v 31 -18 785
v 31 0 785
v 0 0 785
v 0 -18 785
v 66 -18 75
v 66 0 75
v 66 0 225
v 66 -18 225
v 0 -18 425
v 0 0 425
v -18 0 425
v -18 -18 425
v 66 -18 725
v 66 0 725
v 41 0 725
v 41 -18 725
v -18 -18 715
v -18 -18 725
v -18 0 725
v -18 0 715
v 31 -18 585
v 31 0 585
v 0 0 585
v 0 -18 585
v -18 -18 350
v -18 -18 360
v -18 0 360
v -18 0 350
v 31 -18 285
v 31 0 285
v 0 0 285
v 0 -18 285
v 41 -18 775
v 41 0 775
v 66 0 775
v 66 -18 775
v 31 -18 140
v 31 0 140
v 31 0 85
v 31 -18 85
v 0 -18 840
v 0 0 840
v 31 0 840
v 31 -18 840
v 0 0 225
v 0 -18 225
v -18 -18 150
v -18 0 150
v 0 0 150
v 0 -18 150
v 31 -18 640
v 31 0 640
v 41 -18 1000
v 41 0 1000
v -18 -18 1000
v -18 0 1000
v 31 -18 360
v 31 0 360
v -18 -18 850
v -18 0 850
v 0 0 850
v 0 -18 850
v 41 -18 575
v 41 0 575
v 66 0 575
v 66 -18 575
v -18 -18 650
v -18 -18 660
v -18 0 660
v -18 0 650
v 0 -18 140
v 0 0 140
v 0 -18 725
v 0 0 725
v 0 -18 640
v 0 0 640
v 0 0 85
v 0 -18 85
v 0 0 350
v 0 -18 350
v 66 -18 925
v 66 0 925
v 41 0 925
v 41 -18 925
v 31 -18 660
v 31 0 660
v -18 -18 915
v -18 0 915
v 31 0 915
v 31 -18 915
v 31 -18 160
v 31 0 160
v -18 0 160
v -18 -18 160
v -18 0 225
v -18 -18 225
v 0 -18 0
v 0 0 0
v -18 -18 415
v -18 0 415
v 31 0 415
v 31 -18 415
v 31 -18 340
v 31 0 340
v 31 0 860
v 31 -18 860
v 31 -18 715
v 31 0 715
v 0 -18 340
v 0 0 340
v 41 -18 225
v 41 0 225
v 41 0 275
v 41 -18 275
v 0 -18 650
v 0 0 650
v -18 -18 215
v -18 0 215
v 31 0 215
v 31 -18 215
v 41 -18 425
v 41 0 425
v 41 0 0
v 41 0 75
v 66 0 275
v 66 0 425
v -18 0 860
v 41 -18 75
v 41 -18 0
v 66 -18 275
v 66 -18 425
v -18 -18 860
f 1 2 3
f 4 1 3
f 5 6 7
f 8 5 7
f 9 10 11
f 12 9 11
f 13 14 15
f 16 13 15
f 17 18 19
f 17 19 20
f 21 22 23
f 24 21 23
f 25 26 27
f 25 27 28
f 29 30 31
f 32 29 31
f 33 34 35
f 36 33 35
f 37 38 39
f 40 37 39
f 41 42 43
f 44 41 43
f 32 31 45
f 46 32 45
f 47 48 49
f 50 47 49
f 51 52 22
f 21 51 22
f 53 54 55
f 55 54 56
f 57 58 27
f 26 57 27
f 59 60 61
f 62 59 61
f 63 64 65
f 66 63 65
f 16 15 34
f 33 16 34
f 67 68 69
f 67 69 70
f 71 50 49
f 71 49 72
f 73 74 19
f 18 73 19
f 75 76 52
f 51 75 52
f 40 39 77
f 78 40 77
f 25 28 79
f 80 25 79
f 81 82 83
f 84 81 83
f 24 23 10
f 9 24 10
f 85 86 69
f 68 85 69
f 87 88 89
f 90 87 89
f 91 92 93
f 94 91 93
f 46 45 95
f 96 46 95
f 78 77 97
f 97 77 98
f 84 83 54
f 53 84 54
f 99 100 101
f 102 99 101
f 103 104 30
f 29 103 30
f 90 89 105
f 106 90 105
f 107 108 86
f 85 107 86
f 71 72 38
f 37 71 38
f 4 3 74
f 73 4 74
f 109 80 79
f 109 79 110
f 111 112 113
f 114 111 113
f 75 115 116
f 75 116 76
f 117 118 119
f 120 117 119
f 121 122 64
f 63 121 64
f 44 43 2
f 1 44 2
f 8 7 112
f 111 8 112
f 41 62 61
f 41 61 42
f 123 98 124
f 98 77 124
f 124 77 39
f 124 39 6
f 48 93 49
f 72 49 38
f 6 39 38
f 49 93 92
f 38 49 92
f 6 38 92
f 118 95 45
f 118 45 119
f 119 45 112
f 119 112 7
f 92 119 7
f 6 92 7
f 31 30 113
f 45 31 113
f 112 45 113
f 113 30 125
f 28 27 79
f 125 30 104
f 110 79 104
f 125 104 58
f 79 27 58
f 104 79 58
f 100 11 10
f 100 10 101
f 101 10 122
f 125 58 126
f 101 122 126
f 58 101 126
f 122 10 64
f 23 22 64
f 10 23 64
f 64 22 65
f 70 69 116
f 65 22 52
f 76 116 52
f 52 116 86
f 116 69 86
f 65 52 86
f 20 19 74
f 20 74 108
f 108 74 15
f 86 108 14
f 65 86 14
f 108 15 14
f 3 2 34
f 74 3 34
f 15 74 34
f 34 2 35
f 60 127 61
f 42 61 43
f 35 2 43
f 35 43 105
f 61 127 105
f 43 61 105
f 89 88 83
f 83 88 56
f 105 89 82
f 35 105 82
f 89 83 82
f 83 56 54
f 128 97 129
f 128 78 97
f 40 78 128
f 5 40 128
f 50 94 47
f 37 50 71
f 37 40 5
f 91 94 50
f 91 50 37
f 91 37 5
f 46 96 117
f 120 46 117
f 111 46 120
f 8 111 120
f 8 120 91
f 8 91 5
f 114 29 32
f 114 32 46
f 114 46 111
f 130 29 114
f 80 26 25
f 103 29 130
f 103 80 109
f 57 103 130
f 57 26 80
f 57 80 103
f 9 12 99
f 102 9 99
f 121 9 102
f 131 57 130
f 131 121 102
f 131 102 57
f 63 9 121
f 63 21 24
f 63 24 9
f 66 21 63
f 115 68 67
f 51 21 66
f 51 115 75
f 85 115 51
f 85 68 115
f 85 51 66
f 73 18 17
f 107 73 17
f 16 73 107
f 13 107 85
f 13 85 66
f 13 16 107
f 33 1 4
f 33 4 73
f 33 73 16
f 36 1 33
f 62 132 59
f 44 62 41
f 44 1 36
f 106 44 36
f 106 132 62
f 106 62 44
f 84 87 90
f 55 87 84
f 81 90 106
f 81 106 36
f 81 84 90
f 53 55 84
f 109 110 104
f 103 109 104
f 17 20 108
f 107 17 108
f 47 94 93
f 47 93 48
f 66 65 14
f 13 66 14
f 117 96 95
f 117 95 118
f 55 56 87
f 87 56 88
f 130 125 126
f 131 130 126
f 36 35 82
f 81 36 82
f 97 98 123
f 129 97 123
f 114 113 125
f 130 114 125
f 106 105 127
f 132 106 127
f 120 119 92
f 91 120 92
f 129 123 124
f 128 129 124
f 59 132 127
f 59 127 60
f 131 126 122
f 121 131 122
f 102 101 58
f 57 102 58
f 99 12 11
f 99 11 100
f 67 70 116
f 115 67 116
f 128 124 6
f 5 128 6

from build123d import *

# Parameters (mm, degrees)
F1_DEPTH = 18


with BuildPart() as f1:
    # F0 (on Front) → F1 (new body)
    with BuildSketch(Plane.XZ):
        Polygon((0, 0), (41, 0), (41, 75), (66, 75), (66, 225), (41, 225), (41, 275), (66, 275), (66, 425), (41, 425), (41, 575), (66, 575), (66, 725), (41, 725), (41, 775), (66, 775), (66, 925), (41, 925), (41, 1000), (-18, 1000), (-18, 915), (31, 915), (31, 860), (-18, 860), (-18, 850), (0, 850), (0, 840), (31, 840), (31, 785), (0, 785), (0, 725), (-18, 725), (-18, 715), (31, 715), (31, 660), (-18, 660), (-18, 650), (0, 650), (0, 640), (31, 640), (31, 585), (0, 585), (0, 425), (-18, 425), (-18, 415), (31, 415), (31, 360), (-18, 360), (-18, 350), (0, 350), (0, 340), (31, 340), (31, 285), (0, 285), (0, 225), (-18, 225), (-18, 215), (31, 215), (31, 160), (-18, 160), (-18, 150), (0, 150), (0, 140), (31, 140), (31, 85), (0, 85), align=None)
    extrude(amount=F1_DEPTH)


solid = f1.part
